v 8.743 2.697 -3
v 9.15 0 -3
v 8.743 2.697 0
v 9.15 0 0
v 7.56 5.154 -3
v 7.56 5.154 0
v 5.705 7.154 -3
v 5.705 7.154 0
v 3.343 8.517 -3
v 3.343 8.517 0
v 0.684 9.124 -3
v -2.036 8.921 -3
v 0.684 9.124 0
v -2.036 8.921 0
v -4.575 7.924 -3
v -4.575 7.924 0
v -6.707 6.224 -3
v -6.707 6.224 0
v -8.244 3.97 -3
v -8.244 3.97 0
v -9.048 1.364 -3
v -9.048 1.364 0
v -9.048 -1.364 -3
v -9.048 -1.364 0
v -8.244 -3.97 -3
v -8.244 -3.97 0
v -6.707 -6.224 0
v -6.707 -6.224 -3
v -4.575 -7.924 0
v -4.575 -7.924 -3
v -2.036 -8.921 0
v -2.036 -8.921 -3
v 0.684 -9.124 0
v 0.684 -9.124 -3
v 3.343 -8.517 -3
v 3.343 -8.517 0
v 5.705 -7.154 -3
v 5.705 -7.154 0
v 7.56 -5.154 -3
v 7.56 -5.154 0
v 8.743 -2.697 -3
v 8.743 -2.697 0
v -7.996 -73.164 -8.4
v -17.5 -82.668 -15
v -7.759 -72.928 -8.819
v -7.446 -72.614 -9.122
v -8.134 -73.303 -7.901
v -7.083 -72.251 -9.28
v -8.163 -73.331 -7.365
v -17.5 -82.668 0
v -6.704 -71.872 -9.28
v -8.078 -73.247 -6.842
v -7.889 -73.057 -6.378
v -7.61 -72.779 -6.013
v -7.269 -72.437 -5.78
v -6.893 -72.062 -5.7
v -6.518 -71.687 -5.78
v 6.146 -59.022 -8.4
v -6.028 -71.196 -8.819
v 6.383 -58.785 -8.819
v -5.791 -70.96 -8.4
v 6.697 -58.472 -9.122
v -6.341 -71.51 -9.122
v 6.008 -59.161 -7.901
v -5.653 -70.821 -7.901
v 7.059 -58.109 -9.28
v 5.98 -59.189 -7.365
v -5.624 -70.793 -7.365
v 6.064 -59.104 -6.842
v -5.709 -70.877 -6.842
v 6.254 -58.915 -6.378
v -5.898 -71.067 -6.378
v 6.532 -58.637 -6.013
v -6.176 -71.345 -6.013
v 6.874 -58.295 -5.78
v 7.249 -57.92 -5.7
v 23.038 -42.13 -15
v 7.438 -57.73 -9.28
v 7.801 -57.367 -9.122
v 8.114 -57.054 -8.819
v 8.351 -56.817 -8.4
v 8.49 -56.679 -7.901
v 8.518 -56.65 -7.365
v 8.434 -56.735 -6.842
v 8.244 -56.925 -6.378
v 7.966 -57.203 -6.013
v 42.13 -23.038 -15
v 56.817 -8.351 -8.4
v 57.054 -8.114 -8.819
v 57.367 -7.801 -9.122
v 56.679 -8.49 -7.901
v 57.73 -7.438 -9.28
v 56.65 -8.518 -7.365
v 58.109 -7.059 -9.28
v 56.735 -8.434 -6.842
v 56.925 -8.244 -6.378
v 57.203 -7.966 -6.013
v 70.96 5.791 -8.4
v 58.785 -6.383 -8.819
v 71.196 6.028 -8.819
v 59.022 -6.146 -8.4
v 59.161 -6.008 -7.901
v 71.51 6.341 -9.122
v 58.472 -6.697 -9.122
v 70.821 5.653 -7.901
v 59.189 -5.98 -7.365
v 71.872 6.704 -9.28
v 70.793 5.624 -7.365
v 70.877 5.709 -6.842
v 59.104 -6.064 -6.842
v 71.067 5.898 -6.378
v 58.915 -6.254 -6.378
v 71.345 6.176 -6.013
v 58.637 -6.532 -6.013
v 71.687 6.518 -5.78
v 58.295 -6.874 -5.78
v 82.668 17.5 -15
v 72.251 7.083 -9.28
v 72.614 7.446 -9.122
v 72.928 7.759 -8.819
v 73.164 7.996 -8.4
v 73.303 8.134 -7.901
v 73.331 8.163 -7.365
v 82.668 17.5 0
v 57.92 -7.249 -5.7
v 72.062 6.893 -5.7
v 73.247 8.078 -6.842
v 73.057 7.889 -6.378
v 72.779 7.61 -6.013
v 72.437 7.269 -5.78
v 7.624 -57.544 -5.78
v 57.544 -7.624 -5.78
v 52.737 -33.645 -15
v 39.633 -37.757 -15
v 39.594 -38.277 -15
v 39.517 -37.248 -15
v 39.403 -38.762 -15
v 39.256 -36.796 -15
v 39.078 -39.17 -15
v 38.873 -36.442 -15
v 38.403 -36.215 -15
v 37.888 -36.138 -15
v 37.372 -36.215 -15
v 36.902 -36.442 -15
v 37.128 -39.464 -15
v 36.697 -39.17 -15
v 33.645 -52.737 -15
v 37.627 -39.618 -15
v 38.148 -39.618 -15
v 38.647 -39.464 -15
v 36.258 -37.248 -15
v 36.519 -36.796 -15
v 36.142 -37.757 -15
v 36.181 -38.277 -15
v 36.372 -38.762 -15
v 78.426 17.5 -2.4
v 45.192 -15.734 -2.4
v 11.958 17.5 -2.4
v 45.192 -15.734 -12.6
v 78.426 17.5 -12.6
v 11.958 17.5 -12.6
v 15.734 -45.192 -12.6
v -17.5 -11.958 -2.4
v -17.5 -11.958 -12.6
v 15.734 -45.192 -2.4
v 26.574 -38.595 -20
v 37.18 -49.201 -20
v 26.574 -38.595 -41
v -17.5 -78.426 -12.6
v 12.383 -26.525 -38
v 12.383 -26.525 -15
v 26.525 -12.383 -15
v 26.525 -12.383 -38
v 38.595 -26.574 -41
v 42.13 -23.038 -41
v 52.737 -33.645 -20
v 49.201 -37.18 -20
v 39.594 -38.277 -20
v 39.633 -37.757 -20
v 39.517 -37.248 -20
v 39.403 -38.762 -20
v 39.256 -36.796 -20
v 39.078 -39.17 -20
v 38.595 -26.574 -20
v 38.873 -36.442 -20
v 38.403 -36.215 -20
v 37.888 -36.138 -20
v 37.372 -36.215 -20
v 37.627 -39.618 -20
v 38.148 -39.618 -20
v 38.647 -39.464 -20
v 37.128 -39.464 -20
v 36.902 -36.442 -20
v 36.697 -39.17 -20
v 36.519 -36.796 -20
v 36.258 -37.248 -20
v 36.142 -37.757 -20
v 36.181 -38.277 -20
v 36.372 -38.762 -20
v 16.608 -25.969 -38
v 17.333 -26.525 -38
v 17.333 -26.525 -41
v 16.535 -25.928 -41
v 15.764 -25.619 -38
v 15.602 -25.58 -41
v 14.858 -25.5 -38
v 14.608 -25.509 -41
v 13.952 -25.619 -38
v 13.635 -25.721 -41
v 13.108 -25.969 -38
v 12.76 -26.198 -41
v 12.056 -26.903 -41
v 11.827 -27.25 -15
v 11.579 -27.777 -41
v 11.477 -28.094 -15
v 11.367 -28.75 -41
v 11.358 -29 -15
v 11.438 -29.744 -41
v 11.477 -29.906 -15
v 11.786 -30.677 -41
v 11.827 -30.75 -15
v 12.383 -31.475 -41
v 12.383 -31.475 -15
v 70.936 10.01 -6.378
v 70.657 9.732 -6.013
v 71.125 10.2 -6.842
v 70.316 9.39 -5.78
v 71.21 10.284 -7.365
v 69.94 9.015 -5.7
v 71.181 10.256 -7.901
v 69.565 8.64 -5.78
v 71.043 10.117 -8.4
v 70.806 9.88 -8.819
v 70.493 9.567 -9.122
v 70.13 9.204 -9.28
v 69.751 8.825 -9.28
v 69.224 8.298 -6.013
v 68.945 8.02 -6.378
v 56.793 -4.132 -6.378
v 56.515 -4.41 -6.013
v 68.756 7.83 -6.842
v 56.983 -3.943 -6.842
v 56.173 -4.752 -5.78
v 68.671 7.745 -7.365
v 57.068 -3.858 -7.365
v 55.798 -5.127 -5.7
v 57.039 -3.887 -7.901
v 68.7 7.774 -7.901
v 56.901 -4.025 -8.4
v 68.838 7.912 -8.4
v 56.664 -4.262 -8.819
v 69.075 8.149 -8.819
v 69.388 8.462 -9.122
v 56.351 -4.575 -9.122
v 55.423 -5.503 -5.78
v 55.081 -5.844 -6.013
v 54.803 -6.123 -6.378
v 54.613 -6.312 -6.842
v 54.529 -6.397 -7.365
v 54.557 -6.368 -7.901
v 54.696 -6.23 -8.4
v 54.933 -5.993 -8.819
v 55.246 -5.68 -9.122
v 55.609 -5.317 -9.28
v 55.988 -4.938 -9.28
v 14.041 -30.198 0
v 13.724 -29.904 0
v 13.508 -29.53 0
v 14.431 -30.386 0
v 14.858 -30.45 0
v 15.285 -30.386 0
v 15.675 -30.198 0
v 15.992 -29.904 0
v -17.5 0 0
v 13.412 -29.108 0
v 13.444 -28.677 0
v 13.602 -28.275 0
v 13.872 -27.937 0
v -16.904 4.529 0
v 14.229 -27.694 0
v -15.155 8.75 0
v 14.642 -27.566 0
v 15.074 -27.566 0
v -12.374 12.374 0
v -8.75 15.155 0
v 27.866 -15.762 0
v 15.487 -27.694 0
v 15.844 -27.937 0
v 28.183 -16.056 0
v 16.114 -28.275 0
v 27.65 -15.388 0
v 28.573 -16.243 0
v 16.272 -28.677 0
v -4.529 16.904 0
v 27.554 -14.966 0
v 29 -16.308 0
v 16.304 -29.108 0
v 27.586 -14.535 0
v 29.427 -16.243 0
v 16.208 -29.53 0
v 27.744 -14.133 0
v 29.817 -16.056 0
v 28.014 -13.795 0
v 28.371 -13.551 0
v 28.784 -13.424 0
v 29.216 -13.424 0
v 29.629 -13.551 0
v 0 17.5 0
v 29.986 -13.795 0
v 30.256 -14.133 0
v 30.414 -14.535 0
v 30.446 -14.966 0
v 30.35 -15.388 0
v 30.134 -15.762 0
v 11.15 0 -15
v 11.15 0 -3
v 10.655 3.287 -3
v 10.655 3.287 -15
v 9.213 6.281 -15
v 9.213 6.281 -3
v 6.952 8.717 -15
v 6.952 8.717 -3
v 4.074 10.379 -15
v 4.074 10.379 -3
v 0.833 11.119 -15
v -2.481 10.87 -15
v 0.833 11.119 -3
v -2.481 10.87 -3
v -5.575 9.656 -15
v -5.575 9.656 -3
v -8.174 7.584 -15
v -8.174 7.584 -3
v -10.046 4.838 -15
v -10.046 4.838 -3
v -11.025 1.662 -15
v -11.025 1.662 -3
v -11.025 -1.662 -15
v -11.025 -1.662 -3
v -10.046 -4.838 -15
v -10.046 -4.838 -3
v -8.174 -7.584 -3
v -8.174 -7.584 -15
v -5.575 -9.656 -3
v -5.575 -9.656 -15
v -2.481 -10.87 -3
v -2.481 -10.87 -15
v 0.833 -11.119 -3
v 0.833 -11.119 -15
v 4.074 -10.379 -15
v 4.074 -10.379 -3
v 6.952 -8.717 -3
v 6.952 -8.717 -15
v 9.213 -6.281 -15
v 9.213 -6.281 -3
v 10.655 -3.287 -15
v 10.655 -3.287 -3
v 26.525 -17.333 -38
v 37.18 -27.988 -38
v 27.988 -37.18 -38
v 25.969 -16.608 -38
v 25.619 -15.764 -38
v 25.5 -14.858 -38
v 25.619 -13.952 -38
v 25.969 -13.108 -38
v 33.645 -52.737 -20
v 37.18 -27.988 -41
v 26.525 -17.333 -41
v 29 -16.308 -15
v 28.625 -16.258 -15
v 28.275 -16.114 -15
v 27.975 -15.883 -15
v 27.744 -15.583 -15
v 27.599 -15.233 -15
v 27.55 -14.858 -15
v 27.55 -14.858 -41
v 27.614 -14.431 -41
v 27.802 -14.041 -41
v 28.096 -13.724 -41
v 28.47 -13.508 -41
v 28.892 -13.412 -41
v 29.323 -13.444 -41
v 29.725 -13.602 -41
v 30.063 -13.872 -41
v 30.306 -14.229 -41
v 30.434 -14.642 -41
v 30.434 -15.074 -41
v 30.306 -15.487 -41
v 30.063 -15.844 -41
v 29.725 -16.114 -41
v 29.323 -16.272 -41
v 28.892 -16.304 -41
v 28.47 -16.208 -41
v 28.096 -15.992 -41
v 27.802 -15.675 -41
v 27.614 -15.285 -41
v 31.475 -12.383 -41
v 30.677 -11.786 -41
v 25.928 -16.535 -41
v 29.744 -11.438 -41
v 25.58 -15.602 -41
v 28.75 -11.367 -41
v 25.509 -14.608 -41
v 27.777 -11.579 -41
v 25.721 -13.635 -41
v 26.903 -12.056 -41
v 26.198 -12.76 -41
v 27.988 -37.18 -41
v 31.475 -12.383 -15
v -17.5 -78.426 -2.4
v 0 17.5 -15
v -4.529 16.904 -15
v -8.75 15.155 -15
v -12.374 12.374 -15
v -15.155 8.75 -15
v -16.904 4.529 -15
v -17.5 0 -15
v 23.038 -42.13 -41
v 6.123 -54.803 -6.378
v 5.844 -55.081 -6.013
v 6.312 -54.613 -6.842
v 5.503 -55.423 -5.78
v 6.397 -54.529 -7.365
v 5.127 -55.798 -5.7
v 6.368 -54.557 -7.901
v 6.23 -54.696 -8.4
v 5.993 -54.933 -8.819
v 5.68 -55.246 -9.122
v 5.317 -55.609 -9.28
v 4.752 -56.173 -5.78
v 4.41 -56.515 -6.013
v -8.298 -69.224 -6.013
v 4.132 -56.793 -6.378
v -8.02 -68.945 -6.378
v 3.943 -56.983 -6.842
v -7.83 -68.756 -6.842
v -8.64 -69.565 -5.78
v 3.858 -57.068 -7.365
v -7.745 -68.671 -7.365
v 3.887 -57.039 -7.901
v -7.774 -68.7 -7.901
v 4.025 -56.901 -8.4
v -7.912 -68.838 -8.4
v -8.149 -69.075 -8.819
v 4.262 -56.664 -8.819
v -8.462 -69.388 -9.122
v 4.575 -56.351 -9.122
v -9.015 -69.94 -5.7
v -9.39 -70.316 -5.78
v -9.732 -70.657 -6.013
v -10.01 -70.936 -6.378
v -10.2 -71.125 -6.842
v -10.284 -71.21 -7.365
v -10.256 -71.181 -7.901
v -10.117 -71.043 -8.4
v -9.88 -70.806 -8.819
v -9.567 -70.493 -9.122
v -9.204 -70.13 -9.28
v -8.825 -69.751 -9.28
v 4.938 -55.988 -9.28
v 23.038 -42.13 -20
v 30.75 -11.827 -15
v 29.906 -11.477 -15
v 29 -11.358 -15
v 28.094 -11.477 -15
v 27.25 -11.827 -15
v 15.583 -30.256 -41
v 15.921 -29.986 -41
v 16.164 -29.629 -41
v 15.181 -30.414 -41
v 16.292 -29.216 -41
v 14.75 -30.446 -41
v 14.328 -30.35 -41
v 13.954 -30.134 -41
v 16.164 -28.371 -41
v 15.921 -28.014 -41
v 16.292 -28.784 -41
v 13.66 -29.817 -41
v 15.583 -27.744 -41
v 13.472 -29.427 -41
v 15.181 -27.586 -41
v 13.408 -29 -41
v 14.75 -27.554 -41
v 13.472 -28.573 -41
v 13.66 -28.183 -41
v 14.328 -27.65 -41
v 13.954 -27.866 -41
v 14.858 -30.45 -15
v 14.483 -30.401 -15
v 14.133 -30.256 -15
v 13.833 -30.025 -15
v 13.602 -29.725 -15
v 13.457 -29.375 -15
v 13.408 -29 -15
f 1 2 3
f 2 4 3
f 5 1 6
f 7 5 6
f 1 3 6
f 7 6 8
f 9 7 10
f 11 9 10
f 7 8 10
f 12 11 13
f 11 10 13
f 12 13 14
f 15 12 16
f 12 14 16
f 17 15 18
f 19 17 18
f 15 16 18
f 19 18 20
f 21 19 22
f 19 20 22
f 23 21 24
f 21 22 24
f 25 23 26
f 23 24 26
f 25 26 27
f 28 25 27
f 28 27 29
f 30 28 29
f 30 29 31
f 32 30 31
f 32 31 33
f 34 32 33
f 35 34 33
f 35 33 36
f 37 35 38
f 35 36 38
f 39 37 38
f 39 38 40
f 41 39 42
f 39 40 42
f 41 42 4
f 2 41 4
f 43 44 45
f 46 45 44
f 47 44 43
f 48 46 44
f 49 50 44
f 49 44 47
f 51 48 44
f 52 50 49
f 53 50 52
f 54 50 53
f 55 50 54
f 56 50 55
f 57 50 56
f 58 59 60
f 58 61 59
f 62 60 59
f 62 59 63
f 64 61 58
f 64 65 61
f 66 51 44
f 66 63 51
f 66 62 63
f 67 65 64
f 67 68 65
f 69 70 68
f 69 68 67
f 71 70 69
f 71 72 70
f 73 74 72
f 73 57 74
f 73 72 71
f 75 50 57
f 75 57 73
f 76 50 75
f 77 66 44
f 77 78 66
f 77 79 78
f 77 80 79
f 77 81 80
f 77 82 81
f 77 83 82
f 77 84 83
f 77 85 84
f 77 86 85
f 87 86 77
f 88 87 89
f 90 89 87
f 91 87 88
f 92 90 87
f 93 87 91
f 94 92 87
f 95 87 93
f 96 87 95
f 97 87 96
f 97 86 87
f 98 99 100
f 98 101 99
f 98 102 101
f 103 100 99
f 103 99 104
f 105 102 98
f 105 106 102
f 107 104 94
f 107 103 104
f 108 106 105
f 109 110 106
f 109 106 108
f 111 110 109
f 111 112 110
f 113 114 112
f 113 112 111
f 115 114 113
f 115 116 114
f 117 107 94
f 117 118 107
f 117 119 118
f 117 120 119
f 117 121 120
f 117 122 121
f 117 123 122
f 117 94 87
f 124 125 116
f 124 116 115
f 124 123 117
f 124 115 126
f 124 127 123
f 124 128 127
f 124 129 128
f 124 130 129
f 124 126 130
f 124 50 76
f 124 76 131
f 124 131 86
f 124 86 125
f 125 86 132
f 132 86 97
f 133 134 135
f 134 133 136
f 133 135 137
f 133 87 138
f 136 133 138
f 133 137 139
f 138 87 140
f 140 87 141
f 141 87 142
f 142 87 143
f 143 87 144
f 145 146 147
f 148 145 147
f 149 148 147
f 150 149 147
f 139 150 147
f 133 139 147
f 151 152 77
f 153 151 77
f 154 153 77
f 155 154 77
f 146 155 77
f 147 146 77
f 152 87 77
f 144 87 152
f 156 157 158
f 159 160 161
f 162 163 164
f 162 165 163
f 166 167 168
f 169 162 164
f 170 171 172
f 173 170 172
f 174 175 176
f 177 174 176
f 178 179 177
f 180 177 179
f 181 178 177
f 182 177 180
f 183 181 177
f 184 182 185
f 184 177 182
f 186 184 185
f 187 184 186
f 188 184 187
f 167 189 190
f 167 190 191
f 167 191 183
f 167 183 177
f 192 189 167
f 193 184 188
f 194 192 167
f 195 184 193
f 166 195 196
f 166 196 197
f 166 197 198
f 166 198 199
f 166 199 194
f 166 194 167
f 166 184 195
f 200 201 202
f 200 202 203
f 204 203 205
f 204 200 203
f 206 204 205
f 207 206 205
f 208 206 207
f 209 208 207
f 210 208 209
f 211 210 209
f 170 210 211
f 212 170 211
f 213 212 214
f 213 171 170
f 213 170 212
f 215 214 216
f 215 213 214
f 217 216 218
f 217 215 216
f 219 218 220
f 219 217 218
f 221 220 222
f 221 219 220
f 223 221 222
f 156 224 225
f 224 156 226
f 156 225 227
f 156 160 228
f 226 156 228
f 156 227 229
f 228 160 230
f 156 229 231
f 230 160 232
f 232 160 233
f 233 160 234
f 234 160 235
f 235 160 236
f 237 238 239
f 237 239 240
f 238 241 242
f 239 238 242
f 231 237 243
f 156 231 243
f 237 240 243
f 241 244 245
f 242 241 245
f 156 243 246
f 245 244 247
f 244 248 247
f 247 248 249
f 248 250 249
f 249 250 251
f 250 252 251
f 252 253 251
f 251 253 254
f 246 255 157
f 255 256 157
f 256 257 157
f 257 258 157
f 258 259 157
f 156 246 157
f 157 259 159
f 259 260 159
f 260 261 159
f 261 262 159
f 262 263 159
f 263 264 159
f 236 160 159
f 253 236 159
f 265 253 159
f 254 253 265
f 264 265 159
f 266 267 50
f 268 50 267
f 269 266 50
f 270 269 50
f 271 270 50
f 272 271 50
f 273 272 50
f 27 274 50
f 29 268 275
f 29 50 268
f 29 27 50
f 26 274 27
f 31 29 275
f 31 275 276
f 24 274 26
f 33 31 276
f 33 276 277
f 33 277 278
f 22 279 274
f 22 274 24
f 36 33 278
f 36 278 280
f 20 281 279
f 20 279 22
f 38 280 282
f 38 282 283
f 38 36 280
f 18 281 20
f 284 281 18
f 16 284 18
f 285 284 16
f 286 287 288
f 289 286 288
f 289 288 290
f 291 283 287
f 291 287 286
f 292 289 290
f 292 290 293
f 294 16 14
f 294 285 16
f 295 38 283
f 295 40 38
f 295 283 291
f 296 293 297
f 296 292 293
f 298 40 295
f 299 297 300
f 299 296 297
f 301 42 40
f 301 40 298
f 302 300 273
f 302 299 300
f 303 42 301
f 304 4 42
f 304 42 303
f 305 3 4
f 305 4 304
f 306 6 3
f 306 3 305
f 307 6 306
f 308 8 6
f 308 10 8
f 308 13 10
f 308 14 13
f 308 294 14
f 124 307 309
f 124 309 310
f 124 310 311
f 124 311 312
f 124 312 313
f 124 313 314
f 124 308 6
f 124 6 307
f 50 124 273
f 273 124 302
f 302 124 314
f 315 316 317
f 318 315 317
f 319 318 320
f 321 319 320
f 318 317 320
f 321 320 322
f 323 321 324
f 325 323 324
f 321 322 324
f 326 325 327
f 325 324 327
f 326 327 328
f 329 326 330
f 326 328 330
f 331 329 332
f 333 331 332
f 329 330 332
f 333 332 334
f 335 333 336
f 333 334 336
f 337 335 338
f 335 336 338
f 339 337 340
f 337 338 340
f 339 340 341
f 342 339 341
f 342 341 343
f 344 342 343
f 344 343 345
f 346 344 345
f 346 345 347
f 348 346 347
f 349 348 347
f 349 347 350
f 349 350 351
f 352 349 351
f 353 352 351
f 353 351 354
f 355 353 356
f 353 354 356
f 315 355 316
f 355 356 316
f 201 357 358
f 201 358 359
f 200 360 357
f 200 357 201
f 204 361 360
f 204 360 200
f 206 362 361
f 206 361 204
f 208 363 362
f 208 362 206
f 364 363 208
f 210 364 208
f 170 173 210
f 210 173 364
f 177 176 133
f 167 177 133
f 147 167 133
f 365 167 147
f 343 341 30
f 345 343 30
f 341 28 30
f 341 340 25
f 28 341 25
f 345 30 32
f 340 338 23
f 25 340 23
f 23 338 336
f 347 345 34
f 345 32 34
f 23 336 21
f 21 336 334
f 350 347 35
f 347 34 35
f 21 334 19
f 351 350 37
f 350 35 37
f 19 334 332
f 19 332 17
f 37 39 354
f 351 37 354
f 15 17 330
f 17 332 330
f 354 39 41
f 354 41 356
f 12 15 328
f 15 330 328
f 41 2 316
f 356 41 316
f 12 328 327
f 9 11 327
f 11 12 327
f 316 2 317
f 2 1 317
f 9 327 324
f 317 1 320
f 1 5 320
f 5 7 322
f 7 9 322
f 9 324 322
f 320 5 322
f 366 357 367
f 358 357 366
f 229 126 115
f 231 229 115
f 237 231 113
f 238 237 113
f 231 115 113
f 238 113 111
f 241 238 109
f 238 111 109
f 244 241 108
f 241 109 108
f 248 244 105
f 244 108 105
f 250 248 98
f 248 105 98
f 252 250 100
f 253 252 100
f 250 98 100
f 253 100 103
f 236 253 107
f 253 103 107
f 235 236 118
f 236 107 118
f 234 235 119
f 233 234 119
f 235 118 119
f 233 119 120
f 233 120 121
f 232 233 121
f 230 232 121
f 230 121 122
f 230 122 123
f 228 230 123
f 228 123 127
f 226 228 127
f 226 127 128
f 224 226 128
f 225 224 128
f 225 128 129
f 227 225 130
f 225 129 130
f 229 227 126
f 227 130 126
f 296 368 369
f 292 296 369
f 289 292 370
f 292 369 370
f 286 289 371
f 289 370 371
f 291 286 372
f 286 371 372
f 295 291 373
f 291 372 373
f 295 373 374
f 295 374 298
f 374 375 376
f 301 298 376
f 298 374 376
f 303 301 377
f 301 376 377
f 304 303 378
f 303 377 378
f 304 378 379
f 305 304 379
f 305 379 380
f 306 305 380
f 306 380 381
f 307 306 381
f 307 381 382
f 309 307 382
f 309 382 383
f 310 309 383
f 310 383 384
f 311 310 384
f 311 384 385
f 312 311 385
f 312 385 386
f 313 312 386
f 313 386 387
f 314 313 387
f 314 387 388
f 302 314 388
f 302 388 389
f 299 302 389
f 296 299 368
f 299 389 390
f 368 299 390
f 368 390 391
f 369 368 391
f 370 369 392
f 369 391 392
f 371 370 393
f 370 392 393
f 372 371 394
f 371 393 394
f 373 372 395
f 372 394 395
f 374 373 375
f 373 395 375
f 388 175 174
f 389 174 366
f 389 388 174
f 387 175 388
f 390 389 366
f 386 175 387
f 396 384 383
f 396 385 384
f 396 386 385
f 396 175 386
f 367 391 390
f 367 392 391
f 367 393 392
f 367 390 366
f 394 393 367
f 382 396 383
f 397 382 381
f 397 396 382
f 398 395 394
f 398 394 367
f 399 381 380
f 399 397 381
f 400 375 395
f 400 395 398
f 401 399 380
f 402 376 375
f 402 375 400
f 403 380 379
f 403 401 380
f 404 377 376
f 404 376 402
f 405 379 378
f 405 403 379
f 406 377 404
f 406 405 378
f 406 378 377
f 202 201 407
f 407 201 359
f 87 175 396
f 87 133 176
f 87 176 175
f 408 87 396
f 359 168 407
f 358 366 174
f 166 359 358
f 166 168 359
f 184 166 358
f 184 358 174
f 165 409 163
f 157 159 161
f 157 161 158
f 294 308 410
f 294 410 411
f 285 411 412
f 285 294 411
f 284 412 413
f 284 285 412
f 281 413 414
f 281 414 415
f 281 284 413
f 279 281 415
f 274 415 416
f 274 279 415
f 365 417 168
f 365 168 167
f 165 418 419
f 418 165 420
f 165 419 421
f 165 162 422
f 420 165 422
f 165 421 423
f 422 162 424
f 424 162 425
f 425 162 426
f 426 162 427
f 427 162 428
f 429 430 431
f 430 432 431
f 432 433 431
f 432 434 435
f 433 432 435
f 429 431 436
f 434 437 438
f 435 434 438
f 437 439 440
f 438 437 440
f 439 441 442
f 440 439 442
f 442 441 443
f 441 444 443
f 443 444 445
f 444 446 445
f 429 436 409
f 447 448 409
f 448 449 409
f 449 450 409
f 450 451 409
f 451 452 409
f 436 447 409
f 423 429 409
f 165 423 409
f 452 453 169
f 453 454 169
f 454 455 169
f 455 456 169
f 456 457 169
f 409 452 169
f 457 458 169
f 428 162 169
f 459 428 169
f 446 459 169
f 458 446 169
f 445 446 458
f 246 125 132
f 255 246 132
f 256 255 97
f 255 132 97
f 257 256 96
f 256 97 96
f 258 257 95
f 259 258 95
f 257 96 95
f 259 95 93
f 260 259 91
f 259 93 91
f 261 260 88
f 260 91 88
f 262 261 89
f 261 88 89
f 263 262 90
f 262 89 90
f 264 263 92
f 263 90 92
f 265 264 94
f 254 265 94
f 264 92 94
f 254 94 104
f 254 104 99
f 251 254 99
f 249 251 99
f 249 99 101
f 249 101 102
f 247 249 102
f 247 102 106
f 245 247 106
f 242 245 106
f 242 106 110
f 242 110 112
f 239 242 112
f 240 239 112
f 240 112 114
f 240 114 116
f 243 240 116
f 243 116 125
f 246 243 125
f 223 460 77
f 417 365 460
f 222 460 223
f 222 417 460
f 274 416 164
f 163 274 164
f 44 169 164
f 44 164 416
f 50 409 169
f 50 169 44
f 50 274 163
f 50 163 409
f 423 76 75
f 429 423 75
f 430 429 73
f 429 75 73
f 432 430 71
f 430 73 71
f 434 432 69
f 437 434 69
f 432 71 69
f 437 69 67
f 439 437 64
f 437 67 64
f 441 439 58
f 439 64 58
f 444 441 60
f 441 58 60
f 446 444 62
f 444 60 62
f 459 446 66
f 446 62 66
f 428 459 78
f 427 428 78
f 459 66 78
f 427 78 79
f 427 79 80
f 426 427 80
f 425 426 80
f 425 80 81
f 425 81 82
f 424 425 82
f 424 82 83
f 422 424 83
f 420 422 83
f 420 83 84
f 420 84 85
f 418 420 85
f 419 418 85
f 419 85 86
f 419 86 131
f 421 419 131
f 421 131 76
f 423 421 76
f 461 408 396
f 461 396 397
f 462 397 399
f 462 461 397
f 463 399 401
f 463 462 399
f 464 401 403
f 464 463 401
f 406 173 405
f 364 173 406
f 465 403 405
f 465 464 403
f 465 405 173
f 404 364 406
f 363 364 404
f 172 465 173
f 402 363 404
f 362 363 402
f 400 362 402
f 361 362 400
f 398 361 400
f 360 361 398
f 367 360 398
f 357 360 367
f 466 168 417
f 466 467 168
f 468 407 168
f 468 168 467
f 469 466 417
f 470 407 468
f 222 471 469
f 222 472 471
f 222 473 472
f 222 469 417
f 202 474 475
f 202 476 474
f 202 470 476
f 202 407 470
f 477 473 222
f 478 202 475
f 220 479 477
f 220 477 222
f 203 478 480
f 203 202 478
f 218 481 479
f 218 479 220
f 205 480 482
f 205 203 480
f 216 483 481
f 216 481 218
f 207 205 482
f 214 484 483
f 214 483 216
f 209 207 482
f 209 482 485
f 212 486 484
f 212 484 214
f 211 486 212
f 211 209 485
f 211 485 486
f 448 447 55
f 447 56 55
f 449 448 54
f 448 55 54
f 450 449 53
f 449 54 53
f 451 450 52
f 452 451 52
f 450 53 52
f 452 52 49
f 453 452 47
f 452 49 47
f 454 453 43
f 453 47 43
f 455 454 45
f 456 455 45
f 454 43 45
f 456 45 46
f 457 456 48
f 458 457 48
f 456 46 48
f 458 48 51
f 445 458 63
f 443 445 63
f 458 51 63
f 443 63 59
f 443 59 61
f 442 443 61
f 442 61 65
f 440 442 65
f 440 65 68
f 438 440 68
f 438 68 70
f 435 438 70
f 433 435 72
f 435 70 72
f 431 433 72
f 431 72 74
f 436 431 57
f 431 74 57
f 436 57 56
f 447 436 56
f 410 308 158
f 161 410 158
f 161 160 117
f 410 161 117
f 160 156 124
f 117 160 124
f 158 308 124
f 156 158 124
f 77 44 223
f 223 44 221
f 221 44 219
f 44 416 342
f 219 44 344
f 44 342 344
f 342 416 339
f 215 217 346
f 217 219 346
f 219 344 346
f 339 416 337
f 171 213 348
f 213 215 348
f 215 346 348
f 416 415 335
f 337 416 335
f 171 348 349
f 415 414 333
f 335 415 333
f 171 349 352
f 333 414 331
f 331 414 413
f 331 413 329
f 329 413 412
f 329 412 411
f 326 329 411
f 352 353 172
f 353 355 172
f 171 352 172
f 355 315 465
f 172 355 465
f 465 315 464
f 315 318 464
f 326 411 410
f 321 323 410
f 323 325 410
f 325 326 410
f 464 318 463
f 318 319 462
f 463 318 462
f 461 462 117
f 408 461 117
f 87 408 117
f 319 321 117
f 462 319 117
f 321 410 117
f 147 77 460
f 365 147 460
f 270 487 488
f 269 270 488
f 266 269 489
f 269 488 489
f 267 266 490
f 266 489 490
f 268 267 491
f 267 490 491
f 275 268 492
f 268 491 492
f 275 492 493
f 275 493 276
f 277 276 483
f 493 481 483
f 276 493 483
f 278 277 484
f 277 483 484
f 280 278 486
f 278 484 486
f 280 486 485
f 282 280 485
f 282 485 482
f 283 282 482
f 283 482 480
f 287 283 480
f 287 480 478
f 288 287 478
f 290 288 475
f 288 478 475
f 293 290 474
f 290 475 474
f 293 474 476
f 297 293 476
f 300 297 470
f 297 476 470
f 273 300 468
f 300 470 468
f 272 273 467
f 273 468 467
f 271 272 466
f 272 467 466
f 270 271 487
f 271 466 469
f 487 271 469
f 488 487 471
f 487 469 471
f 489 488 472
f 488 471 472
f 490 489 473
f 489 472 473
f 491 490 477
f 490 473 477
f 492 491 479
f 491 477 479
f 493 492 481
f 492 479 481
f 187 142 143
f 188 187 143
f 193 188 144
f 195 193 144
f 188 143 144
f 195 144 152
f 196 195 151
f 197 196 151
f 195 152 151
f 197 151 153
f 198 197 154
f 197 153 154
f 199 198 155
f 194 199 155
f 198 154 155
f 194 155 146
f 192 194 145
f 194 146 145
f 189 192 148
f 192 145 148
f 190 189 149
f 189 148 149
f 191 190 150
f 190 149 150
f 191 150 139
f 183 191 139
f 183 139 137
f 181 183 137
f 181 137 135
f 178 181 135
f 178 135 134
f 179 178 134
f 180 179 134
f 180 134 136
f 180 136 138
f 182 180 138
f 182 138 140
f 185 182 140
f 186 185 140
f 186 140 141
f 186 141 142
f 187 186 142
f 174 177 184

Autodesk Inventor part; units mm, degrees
ref_plane "YZ Plane" through (0, 0, 0) normal (1, 0, 0) x (0, 1, 0)
ref_plane "XZ Plane" through (0, 0, 0) normal (0, 1, 0) x (-1, 0, 0)
ref_plane "XY Plane" through (0, 0, 0) normal (0, 0, 1) x (1, 0, 0)
sketch "Sketch1" plane through (0, 0, 0) normal (0, 0, 1) x (1, 0, 0)
  circle A0 centre (0, 0) radius 4 projected
  line L0 (-144.1925, -209.3609) -> (209.3609, 144.1925) projected
  circle A1 centre (0, 0) radius 11.15
  circle A2 centre (0, 0) radius 17.5
  line L1 (-17.5, 0) -> (-17.5, -82.6684)
  line L2 (0, 17.5) -> (82.6684, 17.5)
  point P0 (0, 0)
  dimension "d0" = 22.3
  dimension "d1" = 35
extrude "Extrusion1" add sketch "Sketch1" against normal blind 15 contours L1 A2 L2 L0 | A2
sketch "Sketch2" plane through (0, 0, 0) normal (0, 0, 1) x (1, 0, 0)
  arc A0 (0, 17.5) -> (-17.5, 0) centre (0, 0) ccw projected
  line L0 (-17.5, 0) -> (-17.5, -82.6684) projected
  line L1 (-17.5, -82.6684) -> (82.6684, 17.5) projected
  line L2 (82.6684, 17.5) -> (0, 17.5) projected
  circle A1 centre (0, 0) radius 11.15 projected
  circle A2 centre (0, 0) radius 9.15
  dimension "d6" = 2
extrude "Extrusion2" add sketch "Sketch2" against normal blind 3 contours A1
ref_plane "Work Plane1" through (-19.6213, -80.5471, 0) normal (0.7071068, -0.7071068, 0) x (-0.7071068, -0.7071068, 0)
sketch "Sketch3" plane through (-19.6213, -80.5471, 0) normal (0.7071068, -0.7071068, 0) x (-0.7071068, -0.7071068, 0)
  line L0 (-141.6595, 0) -> (-83.2041, 0) projected
  line L1 (-141.6595, 0) -> (-141.6595, 15) projected
  line L2 (-83.2041, 15) -> (-141.6595, 15) projected
  line L3 (-83.2041, 0) -> (-83.2041, 15) projected
  line L4 (-58.4554, 0) -> (0, 0) projected
  line L5 (-58.4554, 0) -> (-58.4554, 15) projected
  line L6 (0, 15) -> (-58.4554, 15) projected
  line L7 (0, 0) -> (0, 15) projected
  line L8 (-83.2041, 0) -> (-58.4554, 0) projected
  line L9 (-50.8297, 15) -> (-90.8297, 15) projected
  line L10 (-141.6595, 0) -> (-141.6595, 15) projected
  line L11 (-141.6595, 12.6) -> (-91.6595, 12.6)
  line L12 (-91.6595, 12.6) -> (-91.6595, 2.4)
  line L13 (-91.6595, 2.4) -> (-141.6595, 2.4)
  line L14 (-141.6595, 2.4) -> (-141.6595, 12.6)
  line L15 (0, 0) -> (0, 15) projected
  line L16 (0, 2.4) -> (-50, 2.4)
  line L17 (-50, 2.4) -> (-50, 12.6)
  line L18 (-50, 12.6) -> (0, 12.6)
  line L19 (0, 12.6) -> (0, 2.4)
  point P0 (-70.8297, 0)
  point P1 (0, 12.6)
  dimension "d8" = 2.4
  dimension "d9" = 2.4
  dimension "d10" = 2.4
  dimension "d11" = 50
extrude "Extrusion3" cut sketch "Sketch3" against normal through all contours L1 L11 L12 L13 | L16 L17 L18 L7
sketch "Sketch4" plane through (-19.6213, -80.5471, 0) normal (-0.7071068, 0.7071068, 0) x (0, 0, 1)
  line L0 (-12.6, 138.6595) -> (-2.4, 138.6595) projected
  line L1 (-12.6, 91.6595) -> (-12.6, 138.6595) projected
  line L2 (-2.4, 91.6595) -> (-12.6, 91.6595) projected
  line L3 (-2.4, 138.6595) -> (-2.4, 91.6595) projected
  line L4 (-2.4, 3) -> (-12.6, 3) projected
  line L5 (-2.4, 50) -> (-2.4, 3) projected
  line L6 (-12.6, 50) -> (-2.4, 50) projected
  line L7 (-12.6, 3) -> (-12.6, 50) projected
  line L8 (-12.6, 50) -> (-2.4, 50) projected
  line L9 (-2.4, 91.6595) -> (-12.6, 91.6595) projected
  point P0 (0, 70.8297)
  point P1 (-7.5, 106.6595)
  point P2 (-7.5, 126.6595)
  point P3 (-7.5, 35)
  point P4 (-7.5, 15)
  point P5 (-7.5, 50)
  point P6 (-7.5, 91.6595)
  dimension "d14" = 15
  dimension "d15" = 15
  dimension "d16" = 20
  dimension "d17" = 20
hole "Hole1" at (55.7983, -5.1274, -7.5) at (69.9405, 9.0147, -7.5) at (5.1274, -55.7983, -7.5) at (-9.0147, -69.9405, -7.5) direction (0.7071068, -0.7071068, 0) diameter 3.6 end through all clearance for "Hex Head Cap Screw DIN EN 24017" size "M3" standard "DIN"
sketch "Sketch5" plane through (0, 0, 0) normal (0, 0, 1) x (1, 0, 0)
  circle A0 centre (0, 0) radius 9.15 projected
  arc A1 (0, 17.5) -> (-17.5, 0) centre (0, 0) ccw projected
  line L0 (-17.5, 0) -> (-17.5, -82.6684) projected
  line L1 (-17.5, -82.6684) -> (82.6684, 17.5) projected
  line L2 (82.6684, 17.5) -> (0, 17.5) projected
  line L3 (29, -14.8579) -> (14.8579, -29) construction
  dimension "d25" = 29
  dimension "d26" = 29
  dimension "d27" = 20
hole "Hole2" at (29, -14.8579, 0) at (14.8579, -29, 0) direction (0, 0, -1) diameter 2.9 end through all
sketch "Sketch6" plane through (0, 0, -15) normal (0, 0, -1) x (-1, 0, 0)
  circle A0 centre (-29, -14.8579) radius 1.45 projected
  circle A1 centre (-14.8579, -29) radius 1.45 projected
  arc A2 (17.5, 0) -> (0, 17.5) centre (0, 0) ccw projected
  line L0 (0, 17.5) -> (-82.6684, 17.5) projected
  line L1 (-82.6684, 17.5) -> (17.5, -82.6684) projected
  line L2 (17.5, -82.6684) -> (17.5, 0) projected
  circle A3 centre (0, 0) radius 11.15 projected
  circle A4 centre (-14.8579, -29) radius 1.45 projected
  circle A5 centre (-14.8579, -29) radius 3.5
  circle A6 centre (-29, -14.8579) radius 1.45 projected
  circle A7 centre (-29, -14.8579) radius 3.5
  line L3 (-12.383, -31.4749) -> (-23.0382, -42.1301)
  line L4 (-17.3327, -26.5251) -> (-27.988, -37.1804)
  line L5 (-82.6684, 17.5) -> (17.5, -82.6684) projected
  line L6 (-31.4749, -12.383) -> (-42.1301, -23.0382)
  line L7 (-26.5251, -17.3327) -> (-37.1804, -27.988)
  point P0 (0, 0)
  dimension "d35" = 7
extrude "Extrusion4" add sketch "Sketch6" along normal blind 26 contours L1 L4 A5 L3 | L6 A7 L7 L1 | A5 | A7
sketch "Sketch7" plane through (0, 0, -15) normal (0, 0, -1) x (-1, 0, 0)
  line L0 (-26.5251, -17.3327) -> (-37.1804, -27.988) projected
  line L1 (-37.1804, -27.988) -> (-27.988, -37.1804) projected
  line L2 (-27.988, -37.1804) -> (-17.3327, -26.5251) projected
  arc A0 (-12.383, -31.4749) -> (-17.3327, -26.5251) centre (-14.8579, -29) ccw projected
  line L3 (-12.383, -31.4749) -> (-23.0382, -42.1301) projected
  line L4 (-23.0382, -42.1301) -> (17.5, -82.6684) projected
  line L5 (17.5, -82.6684) -> (17.5, 0) projected
  arc A1 (17.5, 0) -> (0, 17.5) centre (0, 0) ccw projected
  line L6 (0, 17.5) -> (-82.6684, 17.5) projected
  line L7 (-82.6684, 17.5) -> (-42.1301, -23.0382) projected
  line L8 (-42.1301, -23.0382) -> (-31.4749, -12.383) projected
  arc A2 (-26.5251, -17.3327) -> (-31.4749, -12.383) centre (-29, -14.8579) ccw projected
  circle A3 centre (0, 0) radius 11.15 projected
  line L9 (-12.383, -26.5251) -> (-26.5251, -12.383)
  arc A4 (-26.5251, -17.3327) -> (-31.4749, -12.383) centre (-29, -14.8579) ccw projected
  point P0 (0, 0)
extrude "Extrusion5" add sketch "Sketch7" along normal blind 23 contours A2 L9 A0 L2 L1 L0
sketch "Sketch8" plane through (-17.5, -82.6684, 0) normal (0.7071068, -0.7071068, 0) x (-0.7071068, -0.7071068, 0)
  circle A0 centre (-35, 7.5) radius 1.8 projected
  circle A1 centre (-106.6595, 7.5) radius 1.8 projected
  circle A2 centre (-126.6595, 7.5) radius 1.8 projected
  circle A3 centre (-15, 7.5) radius 1.8 projected
  line L0 (0, 0) -> (-141.6595, 0) projected
  line L1 (0, 0) -> (0, 15) projected
  line L2 (-57.3297, 15) -> (0, 15) projected
  line L3 (-57.3297, 15) -> (-57.3297, 41) projected
  line L4 (-64.3297, 41) -> (-57.3297, 41) projected
  line L5 (-64.3297, 38) -> (-64.3297, 41) projected
  line L6 (-77.3297, 38) -> (-64.3297, 38) projected
  line L7 (-77.3297, 38) -> (-77.3297, 41) projected
  line L8 (-84.3297, 41) -> (-77.3297, 41) projected
  line L9 (-84.3297, 15) -> (-84.3297, 41) projected
  line L10 (-141.6595, 15) -> (-84.3297, 15) projected
  line L11 (-141.6595, 0) -> (-141.6595, 15) projected
  line L12 (-84.3297, 15) -> (-57.3297, 15)
  line L13 (-83.2041, 15) -> (-141.6595, 15) projected
  line L14 (-84.3297, 15) -> (-84.3297, 41) projected
  line L15 (-84.3297, 20) -> (-57.3297, 20)
  point P0 (-70.8297, 0)
  dimension "d40" = 5
extrude "Extrusion6" add sketch "Sketch8" along normal blind 15 contours L12 L9 L15 L3
sketch "Sketch9" plane through (31.4749, -12.383, -41) normal (0.7071068, 0.7071068, 0) x (-0.7071068, 0.7071068, 0)
  line L0 (-15.0688, 26) -> (0, 26) projected
  line L1 (-15.0688, 26) -> (-30.0688, 26) projected
  line L2 (-30.0688, 21) -> (-30.0688, 26) projected
  line L3 (-15.0688, 21) -> (-30.0688, 21) projected
  line L4 (-15.0688, 21) -> (-15.0688, 0) projected
  line L5 (0, 0) -> (-15.0688, 0) projected
  line L6 (0, 26) -> (0, 0) projected
  line L7 (-15.0688, 0) -> (-30.0688, 21)
  point P0 (31.0122, 41)
extrude "Extrusion7" add sketch "Sketch9" against normal blind 5 contours L3 L4 L7
sketch "Sketch10" plane through (12.383, -31.4749, -15) normal (-0.7071068, -0.7071068, 0) x (-0.7071068, 0.7071068, 0)
  line L0 (-15.0688, 26) -> (-30.0688, 5) projected
  line L1 (-15.0688, 5) -> (-30.0688, 5) projected
  line L2 (-15.0688, 26) -> (-15.0688, 5) projected
  point P0 (31.0122, -15)
extrude "Extrusion8" add sketch "Sketch10" against normal blind 5
sketch "Sketch11" plane through (49.2012, -37.1804, -20) normal (0, 0, -1) x (-0.7071068, -0.7071068, 0)
  line L0 (17, 0) -> (17, 15) projected
  line L1 (0, 15) -> (17, 15) projected
  line L2 (0, 15) -> (0, 0) projected
  line L3 (17, 0) -> (0, 0) projected
  line L4 (2, 15) -> (15, 15) projected
  point P0 (8.5, 61.081)
  point P1 (8.5, 7.5)
  point P2 (0, 7.5)
  point P3 (8.5, 15)
hole "Hole3" at (37.8875, -37.8875, -20) direction (0, 0, 1) diameter 3.5 end through all
equation "\"d9\" = d8"
equation "\"d10\" = d8"
equation "\"d15\" = d14"
equation "\"d17\" = d16"
equation "\"d26\" = d25"
properties part number "Rear Z Axis Bottom Bearing" material "ABS Plastic"
